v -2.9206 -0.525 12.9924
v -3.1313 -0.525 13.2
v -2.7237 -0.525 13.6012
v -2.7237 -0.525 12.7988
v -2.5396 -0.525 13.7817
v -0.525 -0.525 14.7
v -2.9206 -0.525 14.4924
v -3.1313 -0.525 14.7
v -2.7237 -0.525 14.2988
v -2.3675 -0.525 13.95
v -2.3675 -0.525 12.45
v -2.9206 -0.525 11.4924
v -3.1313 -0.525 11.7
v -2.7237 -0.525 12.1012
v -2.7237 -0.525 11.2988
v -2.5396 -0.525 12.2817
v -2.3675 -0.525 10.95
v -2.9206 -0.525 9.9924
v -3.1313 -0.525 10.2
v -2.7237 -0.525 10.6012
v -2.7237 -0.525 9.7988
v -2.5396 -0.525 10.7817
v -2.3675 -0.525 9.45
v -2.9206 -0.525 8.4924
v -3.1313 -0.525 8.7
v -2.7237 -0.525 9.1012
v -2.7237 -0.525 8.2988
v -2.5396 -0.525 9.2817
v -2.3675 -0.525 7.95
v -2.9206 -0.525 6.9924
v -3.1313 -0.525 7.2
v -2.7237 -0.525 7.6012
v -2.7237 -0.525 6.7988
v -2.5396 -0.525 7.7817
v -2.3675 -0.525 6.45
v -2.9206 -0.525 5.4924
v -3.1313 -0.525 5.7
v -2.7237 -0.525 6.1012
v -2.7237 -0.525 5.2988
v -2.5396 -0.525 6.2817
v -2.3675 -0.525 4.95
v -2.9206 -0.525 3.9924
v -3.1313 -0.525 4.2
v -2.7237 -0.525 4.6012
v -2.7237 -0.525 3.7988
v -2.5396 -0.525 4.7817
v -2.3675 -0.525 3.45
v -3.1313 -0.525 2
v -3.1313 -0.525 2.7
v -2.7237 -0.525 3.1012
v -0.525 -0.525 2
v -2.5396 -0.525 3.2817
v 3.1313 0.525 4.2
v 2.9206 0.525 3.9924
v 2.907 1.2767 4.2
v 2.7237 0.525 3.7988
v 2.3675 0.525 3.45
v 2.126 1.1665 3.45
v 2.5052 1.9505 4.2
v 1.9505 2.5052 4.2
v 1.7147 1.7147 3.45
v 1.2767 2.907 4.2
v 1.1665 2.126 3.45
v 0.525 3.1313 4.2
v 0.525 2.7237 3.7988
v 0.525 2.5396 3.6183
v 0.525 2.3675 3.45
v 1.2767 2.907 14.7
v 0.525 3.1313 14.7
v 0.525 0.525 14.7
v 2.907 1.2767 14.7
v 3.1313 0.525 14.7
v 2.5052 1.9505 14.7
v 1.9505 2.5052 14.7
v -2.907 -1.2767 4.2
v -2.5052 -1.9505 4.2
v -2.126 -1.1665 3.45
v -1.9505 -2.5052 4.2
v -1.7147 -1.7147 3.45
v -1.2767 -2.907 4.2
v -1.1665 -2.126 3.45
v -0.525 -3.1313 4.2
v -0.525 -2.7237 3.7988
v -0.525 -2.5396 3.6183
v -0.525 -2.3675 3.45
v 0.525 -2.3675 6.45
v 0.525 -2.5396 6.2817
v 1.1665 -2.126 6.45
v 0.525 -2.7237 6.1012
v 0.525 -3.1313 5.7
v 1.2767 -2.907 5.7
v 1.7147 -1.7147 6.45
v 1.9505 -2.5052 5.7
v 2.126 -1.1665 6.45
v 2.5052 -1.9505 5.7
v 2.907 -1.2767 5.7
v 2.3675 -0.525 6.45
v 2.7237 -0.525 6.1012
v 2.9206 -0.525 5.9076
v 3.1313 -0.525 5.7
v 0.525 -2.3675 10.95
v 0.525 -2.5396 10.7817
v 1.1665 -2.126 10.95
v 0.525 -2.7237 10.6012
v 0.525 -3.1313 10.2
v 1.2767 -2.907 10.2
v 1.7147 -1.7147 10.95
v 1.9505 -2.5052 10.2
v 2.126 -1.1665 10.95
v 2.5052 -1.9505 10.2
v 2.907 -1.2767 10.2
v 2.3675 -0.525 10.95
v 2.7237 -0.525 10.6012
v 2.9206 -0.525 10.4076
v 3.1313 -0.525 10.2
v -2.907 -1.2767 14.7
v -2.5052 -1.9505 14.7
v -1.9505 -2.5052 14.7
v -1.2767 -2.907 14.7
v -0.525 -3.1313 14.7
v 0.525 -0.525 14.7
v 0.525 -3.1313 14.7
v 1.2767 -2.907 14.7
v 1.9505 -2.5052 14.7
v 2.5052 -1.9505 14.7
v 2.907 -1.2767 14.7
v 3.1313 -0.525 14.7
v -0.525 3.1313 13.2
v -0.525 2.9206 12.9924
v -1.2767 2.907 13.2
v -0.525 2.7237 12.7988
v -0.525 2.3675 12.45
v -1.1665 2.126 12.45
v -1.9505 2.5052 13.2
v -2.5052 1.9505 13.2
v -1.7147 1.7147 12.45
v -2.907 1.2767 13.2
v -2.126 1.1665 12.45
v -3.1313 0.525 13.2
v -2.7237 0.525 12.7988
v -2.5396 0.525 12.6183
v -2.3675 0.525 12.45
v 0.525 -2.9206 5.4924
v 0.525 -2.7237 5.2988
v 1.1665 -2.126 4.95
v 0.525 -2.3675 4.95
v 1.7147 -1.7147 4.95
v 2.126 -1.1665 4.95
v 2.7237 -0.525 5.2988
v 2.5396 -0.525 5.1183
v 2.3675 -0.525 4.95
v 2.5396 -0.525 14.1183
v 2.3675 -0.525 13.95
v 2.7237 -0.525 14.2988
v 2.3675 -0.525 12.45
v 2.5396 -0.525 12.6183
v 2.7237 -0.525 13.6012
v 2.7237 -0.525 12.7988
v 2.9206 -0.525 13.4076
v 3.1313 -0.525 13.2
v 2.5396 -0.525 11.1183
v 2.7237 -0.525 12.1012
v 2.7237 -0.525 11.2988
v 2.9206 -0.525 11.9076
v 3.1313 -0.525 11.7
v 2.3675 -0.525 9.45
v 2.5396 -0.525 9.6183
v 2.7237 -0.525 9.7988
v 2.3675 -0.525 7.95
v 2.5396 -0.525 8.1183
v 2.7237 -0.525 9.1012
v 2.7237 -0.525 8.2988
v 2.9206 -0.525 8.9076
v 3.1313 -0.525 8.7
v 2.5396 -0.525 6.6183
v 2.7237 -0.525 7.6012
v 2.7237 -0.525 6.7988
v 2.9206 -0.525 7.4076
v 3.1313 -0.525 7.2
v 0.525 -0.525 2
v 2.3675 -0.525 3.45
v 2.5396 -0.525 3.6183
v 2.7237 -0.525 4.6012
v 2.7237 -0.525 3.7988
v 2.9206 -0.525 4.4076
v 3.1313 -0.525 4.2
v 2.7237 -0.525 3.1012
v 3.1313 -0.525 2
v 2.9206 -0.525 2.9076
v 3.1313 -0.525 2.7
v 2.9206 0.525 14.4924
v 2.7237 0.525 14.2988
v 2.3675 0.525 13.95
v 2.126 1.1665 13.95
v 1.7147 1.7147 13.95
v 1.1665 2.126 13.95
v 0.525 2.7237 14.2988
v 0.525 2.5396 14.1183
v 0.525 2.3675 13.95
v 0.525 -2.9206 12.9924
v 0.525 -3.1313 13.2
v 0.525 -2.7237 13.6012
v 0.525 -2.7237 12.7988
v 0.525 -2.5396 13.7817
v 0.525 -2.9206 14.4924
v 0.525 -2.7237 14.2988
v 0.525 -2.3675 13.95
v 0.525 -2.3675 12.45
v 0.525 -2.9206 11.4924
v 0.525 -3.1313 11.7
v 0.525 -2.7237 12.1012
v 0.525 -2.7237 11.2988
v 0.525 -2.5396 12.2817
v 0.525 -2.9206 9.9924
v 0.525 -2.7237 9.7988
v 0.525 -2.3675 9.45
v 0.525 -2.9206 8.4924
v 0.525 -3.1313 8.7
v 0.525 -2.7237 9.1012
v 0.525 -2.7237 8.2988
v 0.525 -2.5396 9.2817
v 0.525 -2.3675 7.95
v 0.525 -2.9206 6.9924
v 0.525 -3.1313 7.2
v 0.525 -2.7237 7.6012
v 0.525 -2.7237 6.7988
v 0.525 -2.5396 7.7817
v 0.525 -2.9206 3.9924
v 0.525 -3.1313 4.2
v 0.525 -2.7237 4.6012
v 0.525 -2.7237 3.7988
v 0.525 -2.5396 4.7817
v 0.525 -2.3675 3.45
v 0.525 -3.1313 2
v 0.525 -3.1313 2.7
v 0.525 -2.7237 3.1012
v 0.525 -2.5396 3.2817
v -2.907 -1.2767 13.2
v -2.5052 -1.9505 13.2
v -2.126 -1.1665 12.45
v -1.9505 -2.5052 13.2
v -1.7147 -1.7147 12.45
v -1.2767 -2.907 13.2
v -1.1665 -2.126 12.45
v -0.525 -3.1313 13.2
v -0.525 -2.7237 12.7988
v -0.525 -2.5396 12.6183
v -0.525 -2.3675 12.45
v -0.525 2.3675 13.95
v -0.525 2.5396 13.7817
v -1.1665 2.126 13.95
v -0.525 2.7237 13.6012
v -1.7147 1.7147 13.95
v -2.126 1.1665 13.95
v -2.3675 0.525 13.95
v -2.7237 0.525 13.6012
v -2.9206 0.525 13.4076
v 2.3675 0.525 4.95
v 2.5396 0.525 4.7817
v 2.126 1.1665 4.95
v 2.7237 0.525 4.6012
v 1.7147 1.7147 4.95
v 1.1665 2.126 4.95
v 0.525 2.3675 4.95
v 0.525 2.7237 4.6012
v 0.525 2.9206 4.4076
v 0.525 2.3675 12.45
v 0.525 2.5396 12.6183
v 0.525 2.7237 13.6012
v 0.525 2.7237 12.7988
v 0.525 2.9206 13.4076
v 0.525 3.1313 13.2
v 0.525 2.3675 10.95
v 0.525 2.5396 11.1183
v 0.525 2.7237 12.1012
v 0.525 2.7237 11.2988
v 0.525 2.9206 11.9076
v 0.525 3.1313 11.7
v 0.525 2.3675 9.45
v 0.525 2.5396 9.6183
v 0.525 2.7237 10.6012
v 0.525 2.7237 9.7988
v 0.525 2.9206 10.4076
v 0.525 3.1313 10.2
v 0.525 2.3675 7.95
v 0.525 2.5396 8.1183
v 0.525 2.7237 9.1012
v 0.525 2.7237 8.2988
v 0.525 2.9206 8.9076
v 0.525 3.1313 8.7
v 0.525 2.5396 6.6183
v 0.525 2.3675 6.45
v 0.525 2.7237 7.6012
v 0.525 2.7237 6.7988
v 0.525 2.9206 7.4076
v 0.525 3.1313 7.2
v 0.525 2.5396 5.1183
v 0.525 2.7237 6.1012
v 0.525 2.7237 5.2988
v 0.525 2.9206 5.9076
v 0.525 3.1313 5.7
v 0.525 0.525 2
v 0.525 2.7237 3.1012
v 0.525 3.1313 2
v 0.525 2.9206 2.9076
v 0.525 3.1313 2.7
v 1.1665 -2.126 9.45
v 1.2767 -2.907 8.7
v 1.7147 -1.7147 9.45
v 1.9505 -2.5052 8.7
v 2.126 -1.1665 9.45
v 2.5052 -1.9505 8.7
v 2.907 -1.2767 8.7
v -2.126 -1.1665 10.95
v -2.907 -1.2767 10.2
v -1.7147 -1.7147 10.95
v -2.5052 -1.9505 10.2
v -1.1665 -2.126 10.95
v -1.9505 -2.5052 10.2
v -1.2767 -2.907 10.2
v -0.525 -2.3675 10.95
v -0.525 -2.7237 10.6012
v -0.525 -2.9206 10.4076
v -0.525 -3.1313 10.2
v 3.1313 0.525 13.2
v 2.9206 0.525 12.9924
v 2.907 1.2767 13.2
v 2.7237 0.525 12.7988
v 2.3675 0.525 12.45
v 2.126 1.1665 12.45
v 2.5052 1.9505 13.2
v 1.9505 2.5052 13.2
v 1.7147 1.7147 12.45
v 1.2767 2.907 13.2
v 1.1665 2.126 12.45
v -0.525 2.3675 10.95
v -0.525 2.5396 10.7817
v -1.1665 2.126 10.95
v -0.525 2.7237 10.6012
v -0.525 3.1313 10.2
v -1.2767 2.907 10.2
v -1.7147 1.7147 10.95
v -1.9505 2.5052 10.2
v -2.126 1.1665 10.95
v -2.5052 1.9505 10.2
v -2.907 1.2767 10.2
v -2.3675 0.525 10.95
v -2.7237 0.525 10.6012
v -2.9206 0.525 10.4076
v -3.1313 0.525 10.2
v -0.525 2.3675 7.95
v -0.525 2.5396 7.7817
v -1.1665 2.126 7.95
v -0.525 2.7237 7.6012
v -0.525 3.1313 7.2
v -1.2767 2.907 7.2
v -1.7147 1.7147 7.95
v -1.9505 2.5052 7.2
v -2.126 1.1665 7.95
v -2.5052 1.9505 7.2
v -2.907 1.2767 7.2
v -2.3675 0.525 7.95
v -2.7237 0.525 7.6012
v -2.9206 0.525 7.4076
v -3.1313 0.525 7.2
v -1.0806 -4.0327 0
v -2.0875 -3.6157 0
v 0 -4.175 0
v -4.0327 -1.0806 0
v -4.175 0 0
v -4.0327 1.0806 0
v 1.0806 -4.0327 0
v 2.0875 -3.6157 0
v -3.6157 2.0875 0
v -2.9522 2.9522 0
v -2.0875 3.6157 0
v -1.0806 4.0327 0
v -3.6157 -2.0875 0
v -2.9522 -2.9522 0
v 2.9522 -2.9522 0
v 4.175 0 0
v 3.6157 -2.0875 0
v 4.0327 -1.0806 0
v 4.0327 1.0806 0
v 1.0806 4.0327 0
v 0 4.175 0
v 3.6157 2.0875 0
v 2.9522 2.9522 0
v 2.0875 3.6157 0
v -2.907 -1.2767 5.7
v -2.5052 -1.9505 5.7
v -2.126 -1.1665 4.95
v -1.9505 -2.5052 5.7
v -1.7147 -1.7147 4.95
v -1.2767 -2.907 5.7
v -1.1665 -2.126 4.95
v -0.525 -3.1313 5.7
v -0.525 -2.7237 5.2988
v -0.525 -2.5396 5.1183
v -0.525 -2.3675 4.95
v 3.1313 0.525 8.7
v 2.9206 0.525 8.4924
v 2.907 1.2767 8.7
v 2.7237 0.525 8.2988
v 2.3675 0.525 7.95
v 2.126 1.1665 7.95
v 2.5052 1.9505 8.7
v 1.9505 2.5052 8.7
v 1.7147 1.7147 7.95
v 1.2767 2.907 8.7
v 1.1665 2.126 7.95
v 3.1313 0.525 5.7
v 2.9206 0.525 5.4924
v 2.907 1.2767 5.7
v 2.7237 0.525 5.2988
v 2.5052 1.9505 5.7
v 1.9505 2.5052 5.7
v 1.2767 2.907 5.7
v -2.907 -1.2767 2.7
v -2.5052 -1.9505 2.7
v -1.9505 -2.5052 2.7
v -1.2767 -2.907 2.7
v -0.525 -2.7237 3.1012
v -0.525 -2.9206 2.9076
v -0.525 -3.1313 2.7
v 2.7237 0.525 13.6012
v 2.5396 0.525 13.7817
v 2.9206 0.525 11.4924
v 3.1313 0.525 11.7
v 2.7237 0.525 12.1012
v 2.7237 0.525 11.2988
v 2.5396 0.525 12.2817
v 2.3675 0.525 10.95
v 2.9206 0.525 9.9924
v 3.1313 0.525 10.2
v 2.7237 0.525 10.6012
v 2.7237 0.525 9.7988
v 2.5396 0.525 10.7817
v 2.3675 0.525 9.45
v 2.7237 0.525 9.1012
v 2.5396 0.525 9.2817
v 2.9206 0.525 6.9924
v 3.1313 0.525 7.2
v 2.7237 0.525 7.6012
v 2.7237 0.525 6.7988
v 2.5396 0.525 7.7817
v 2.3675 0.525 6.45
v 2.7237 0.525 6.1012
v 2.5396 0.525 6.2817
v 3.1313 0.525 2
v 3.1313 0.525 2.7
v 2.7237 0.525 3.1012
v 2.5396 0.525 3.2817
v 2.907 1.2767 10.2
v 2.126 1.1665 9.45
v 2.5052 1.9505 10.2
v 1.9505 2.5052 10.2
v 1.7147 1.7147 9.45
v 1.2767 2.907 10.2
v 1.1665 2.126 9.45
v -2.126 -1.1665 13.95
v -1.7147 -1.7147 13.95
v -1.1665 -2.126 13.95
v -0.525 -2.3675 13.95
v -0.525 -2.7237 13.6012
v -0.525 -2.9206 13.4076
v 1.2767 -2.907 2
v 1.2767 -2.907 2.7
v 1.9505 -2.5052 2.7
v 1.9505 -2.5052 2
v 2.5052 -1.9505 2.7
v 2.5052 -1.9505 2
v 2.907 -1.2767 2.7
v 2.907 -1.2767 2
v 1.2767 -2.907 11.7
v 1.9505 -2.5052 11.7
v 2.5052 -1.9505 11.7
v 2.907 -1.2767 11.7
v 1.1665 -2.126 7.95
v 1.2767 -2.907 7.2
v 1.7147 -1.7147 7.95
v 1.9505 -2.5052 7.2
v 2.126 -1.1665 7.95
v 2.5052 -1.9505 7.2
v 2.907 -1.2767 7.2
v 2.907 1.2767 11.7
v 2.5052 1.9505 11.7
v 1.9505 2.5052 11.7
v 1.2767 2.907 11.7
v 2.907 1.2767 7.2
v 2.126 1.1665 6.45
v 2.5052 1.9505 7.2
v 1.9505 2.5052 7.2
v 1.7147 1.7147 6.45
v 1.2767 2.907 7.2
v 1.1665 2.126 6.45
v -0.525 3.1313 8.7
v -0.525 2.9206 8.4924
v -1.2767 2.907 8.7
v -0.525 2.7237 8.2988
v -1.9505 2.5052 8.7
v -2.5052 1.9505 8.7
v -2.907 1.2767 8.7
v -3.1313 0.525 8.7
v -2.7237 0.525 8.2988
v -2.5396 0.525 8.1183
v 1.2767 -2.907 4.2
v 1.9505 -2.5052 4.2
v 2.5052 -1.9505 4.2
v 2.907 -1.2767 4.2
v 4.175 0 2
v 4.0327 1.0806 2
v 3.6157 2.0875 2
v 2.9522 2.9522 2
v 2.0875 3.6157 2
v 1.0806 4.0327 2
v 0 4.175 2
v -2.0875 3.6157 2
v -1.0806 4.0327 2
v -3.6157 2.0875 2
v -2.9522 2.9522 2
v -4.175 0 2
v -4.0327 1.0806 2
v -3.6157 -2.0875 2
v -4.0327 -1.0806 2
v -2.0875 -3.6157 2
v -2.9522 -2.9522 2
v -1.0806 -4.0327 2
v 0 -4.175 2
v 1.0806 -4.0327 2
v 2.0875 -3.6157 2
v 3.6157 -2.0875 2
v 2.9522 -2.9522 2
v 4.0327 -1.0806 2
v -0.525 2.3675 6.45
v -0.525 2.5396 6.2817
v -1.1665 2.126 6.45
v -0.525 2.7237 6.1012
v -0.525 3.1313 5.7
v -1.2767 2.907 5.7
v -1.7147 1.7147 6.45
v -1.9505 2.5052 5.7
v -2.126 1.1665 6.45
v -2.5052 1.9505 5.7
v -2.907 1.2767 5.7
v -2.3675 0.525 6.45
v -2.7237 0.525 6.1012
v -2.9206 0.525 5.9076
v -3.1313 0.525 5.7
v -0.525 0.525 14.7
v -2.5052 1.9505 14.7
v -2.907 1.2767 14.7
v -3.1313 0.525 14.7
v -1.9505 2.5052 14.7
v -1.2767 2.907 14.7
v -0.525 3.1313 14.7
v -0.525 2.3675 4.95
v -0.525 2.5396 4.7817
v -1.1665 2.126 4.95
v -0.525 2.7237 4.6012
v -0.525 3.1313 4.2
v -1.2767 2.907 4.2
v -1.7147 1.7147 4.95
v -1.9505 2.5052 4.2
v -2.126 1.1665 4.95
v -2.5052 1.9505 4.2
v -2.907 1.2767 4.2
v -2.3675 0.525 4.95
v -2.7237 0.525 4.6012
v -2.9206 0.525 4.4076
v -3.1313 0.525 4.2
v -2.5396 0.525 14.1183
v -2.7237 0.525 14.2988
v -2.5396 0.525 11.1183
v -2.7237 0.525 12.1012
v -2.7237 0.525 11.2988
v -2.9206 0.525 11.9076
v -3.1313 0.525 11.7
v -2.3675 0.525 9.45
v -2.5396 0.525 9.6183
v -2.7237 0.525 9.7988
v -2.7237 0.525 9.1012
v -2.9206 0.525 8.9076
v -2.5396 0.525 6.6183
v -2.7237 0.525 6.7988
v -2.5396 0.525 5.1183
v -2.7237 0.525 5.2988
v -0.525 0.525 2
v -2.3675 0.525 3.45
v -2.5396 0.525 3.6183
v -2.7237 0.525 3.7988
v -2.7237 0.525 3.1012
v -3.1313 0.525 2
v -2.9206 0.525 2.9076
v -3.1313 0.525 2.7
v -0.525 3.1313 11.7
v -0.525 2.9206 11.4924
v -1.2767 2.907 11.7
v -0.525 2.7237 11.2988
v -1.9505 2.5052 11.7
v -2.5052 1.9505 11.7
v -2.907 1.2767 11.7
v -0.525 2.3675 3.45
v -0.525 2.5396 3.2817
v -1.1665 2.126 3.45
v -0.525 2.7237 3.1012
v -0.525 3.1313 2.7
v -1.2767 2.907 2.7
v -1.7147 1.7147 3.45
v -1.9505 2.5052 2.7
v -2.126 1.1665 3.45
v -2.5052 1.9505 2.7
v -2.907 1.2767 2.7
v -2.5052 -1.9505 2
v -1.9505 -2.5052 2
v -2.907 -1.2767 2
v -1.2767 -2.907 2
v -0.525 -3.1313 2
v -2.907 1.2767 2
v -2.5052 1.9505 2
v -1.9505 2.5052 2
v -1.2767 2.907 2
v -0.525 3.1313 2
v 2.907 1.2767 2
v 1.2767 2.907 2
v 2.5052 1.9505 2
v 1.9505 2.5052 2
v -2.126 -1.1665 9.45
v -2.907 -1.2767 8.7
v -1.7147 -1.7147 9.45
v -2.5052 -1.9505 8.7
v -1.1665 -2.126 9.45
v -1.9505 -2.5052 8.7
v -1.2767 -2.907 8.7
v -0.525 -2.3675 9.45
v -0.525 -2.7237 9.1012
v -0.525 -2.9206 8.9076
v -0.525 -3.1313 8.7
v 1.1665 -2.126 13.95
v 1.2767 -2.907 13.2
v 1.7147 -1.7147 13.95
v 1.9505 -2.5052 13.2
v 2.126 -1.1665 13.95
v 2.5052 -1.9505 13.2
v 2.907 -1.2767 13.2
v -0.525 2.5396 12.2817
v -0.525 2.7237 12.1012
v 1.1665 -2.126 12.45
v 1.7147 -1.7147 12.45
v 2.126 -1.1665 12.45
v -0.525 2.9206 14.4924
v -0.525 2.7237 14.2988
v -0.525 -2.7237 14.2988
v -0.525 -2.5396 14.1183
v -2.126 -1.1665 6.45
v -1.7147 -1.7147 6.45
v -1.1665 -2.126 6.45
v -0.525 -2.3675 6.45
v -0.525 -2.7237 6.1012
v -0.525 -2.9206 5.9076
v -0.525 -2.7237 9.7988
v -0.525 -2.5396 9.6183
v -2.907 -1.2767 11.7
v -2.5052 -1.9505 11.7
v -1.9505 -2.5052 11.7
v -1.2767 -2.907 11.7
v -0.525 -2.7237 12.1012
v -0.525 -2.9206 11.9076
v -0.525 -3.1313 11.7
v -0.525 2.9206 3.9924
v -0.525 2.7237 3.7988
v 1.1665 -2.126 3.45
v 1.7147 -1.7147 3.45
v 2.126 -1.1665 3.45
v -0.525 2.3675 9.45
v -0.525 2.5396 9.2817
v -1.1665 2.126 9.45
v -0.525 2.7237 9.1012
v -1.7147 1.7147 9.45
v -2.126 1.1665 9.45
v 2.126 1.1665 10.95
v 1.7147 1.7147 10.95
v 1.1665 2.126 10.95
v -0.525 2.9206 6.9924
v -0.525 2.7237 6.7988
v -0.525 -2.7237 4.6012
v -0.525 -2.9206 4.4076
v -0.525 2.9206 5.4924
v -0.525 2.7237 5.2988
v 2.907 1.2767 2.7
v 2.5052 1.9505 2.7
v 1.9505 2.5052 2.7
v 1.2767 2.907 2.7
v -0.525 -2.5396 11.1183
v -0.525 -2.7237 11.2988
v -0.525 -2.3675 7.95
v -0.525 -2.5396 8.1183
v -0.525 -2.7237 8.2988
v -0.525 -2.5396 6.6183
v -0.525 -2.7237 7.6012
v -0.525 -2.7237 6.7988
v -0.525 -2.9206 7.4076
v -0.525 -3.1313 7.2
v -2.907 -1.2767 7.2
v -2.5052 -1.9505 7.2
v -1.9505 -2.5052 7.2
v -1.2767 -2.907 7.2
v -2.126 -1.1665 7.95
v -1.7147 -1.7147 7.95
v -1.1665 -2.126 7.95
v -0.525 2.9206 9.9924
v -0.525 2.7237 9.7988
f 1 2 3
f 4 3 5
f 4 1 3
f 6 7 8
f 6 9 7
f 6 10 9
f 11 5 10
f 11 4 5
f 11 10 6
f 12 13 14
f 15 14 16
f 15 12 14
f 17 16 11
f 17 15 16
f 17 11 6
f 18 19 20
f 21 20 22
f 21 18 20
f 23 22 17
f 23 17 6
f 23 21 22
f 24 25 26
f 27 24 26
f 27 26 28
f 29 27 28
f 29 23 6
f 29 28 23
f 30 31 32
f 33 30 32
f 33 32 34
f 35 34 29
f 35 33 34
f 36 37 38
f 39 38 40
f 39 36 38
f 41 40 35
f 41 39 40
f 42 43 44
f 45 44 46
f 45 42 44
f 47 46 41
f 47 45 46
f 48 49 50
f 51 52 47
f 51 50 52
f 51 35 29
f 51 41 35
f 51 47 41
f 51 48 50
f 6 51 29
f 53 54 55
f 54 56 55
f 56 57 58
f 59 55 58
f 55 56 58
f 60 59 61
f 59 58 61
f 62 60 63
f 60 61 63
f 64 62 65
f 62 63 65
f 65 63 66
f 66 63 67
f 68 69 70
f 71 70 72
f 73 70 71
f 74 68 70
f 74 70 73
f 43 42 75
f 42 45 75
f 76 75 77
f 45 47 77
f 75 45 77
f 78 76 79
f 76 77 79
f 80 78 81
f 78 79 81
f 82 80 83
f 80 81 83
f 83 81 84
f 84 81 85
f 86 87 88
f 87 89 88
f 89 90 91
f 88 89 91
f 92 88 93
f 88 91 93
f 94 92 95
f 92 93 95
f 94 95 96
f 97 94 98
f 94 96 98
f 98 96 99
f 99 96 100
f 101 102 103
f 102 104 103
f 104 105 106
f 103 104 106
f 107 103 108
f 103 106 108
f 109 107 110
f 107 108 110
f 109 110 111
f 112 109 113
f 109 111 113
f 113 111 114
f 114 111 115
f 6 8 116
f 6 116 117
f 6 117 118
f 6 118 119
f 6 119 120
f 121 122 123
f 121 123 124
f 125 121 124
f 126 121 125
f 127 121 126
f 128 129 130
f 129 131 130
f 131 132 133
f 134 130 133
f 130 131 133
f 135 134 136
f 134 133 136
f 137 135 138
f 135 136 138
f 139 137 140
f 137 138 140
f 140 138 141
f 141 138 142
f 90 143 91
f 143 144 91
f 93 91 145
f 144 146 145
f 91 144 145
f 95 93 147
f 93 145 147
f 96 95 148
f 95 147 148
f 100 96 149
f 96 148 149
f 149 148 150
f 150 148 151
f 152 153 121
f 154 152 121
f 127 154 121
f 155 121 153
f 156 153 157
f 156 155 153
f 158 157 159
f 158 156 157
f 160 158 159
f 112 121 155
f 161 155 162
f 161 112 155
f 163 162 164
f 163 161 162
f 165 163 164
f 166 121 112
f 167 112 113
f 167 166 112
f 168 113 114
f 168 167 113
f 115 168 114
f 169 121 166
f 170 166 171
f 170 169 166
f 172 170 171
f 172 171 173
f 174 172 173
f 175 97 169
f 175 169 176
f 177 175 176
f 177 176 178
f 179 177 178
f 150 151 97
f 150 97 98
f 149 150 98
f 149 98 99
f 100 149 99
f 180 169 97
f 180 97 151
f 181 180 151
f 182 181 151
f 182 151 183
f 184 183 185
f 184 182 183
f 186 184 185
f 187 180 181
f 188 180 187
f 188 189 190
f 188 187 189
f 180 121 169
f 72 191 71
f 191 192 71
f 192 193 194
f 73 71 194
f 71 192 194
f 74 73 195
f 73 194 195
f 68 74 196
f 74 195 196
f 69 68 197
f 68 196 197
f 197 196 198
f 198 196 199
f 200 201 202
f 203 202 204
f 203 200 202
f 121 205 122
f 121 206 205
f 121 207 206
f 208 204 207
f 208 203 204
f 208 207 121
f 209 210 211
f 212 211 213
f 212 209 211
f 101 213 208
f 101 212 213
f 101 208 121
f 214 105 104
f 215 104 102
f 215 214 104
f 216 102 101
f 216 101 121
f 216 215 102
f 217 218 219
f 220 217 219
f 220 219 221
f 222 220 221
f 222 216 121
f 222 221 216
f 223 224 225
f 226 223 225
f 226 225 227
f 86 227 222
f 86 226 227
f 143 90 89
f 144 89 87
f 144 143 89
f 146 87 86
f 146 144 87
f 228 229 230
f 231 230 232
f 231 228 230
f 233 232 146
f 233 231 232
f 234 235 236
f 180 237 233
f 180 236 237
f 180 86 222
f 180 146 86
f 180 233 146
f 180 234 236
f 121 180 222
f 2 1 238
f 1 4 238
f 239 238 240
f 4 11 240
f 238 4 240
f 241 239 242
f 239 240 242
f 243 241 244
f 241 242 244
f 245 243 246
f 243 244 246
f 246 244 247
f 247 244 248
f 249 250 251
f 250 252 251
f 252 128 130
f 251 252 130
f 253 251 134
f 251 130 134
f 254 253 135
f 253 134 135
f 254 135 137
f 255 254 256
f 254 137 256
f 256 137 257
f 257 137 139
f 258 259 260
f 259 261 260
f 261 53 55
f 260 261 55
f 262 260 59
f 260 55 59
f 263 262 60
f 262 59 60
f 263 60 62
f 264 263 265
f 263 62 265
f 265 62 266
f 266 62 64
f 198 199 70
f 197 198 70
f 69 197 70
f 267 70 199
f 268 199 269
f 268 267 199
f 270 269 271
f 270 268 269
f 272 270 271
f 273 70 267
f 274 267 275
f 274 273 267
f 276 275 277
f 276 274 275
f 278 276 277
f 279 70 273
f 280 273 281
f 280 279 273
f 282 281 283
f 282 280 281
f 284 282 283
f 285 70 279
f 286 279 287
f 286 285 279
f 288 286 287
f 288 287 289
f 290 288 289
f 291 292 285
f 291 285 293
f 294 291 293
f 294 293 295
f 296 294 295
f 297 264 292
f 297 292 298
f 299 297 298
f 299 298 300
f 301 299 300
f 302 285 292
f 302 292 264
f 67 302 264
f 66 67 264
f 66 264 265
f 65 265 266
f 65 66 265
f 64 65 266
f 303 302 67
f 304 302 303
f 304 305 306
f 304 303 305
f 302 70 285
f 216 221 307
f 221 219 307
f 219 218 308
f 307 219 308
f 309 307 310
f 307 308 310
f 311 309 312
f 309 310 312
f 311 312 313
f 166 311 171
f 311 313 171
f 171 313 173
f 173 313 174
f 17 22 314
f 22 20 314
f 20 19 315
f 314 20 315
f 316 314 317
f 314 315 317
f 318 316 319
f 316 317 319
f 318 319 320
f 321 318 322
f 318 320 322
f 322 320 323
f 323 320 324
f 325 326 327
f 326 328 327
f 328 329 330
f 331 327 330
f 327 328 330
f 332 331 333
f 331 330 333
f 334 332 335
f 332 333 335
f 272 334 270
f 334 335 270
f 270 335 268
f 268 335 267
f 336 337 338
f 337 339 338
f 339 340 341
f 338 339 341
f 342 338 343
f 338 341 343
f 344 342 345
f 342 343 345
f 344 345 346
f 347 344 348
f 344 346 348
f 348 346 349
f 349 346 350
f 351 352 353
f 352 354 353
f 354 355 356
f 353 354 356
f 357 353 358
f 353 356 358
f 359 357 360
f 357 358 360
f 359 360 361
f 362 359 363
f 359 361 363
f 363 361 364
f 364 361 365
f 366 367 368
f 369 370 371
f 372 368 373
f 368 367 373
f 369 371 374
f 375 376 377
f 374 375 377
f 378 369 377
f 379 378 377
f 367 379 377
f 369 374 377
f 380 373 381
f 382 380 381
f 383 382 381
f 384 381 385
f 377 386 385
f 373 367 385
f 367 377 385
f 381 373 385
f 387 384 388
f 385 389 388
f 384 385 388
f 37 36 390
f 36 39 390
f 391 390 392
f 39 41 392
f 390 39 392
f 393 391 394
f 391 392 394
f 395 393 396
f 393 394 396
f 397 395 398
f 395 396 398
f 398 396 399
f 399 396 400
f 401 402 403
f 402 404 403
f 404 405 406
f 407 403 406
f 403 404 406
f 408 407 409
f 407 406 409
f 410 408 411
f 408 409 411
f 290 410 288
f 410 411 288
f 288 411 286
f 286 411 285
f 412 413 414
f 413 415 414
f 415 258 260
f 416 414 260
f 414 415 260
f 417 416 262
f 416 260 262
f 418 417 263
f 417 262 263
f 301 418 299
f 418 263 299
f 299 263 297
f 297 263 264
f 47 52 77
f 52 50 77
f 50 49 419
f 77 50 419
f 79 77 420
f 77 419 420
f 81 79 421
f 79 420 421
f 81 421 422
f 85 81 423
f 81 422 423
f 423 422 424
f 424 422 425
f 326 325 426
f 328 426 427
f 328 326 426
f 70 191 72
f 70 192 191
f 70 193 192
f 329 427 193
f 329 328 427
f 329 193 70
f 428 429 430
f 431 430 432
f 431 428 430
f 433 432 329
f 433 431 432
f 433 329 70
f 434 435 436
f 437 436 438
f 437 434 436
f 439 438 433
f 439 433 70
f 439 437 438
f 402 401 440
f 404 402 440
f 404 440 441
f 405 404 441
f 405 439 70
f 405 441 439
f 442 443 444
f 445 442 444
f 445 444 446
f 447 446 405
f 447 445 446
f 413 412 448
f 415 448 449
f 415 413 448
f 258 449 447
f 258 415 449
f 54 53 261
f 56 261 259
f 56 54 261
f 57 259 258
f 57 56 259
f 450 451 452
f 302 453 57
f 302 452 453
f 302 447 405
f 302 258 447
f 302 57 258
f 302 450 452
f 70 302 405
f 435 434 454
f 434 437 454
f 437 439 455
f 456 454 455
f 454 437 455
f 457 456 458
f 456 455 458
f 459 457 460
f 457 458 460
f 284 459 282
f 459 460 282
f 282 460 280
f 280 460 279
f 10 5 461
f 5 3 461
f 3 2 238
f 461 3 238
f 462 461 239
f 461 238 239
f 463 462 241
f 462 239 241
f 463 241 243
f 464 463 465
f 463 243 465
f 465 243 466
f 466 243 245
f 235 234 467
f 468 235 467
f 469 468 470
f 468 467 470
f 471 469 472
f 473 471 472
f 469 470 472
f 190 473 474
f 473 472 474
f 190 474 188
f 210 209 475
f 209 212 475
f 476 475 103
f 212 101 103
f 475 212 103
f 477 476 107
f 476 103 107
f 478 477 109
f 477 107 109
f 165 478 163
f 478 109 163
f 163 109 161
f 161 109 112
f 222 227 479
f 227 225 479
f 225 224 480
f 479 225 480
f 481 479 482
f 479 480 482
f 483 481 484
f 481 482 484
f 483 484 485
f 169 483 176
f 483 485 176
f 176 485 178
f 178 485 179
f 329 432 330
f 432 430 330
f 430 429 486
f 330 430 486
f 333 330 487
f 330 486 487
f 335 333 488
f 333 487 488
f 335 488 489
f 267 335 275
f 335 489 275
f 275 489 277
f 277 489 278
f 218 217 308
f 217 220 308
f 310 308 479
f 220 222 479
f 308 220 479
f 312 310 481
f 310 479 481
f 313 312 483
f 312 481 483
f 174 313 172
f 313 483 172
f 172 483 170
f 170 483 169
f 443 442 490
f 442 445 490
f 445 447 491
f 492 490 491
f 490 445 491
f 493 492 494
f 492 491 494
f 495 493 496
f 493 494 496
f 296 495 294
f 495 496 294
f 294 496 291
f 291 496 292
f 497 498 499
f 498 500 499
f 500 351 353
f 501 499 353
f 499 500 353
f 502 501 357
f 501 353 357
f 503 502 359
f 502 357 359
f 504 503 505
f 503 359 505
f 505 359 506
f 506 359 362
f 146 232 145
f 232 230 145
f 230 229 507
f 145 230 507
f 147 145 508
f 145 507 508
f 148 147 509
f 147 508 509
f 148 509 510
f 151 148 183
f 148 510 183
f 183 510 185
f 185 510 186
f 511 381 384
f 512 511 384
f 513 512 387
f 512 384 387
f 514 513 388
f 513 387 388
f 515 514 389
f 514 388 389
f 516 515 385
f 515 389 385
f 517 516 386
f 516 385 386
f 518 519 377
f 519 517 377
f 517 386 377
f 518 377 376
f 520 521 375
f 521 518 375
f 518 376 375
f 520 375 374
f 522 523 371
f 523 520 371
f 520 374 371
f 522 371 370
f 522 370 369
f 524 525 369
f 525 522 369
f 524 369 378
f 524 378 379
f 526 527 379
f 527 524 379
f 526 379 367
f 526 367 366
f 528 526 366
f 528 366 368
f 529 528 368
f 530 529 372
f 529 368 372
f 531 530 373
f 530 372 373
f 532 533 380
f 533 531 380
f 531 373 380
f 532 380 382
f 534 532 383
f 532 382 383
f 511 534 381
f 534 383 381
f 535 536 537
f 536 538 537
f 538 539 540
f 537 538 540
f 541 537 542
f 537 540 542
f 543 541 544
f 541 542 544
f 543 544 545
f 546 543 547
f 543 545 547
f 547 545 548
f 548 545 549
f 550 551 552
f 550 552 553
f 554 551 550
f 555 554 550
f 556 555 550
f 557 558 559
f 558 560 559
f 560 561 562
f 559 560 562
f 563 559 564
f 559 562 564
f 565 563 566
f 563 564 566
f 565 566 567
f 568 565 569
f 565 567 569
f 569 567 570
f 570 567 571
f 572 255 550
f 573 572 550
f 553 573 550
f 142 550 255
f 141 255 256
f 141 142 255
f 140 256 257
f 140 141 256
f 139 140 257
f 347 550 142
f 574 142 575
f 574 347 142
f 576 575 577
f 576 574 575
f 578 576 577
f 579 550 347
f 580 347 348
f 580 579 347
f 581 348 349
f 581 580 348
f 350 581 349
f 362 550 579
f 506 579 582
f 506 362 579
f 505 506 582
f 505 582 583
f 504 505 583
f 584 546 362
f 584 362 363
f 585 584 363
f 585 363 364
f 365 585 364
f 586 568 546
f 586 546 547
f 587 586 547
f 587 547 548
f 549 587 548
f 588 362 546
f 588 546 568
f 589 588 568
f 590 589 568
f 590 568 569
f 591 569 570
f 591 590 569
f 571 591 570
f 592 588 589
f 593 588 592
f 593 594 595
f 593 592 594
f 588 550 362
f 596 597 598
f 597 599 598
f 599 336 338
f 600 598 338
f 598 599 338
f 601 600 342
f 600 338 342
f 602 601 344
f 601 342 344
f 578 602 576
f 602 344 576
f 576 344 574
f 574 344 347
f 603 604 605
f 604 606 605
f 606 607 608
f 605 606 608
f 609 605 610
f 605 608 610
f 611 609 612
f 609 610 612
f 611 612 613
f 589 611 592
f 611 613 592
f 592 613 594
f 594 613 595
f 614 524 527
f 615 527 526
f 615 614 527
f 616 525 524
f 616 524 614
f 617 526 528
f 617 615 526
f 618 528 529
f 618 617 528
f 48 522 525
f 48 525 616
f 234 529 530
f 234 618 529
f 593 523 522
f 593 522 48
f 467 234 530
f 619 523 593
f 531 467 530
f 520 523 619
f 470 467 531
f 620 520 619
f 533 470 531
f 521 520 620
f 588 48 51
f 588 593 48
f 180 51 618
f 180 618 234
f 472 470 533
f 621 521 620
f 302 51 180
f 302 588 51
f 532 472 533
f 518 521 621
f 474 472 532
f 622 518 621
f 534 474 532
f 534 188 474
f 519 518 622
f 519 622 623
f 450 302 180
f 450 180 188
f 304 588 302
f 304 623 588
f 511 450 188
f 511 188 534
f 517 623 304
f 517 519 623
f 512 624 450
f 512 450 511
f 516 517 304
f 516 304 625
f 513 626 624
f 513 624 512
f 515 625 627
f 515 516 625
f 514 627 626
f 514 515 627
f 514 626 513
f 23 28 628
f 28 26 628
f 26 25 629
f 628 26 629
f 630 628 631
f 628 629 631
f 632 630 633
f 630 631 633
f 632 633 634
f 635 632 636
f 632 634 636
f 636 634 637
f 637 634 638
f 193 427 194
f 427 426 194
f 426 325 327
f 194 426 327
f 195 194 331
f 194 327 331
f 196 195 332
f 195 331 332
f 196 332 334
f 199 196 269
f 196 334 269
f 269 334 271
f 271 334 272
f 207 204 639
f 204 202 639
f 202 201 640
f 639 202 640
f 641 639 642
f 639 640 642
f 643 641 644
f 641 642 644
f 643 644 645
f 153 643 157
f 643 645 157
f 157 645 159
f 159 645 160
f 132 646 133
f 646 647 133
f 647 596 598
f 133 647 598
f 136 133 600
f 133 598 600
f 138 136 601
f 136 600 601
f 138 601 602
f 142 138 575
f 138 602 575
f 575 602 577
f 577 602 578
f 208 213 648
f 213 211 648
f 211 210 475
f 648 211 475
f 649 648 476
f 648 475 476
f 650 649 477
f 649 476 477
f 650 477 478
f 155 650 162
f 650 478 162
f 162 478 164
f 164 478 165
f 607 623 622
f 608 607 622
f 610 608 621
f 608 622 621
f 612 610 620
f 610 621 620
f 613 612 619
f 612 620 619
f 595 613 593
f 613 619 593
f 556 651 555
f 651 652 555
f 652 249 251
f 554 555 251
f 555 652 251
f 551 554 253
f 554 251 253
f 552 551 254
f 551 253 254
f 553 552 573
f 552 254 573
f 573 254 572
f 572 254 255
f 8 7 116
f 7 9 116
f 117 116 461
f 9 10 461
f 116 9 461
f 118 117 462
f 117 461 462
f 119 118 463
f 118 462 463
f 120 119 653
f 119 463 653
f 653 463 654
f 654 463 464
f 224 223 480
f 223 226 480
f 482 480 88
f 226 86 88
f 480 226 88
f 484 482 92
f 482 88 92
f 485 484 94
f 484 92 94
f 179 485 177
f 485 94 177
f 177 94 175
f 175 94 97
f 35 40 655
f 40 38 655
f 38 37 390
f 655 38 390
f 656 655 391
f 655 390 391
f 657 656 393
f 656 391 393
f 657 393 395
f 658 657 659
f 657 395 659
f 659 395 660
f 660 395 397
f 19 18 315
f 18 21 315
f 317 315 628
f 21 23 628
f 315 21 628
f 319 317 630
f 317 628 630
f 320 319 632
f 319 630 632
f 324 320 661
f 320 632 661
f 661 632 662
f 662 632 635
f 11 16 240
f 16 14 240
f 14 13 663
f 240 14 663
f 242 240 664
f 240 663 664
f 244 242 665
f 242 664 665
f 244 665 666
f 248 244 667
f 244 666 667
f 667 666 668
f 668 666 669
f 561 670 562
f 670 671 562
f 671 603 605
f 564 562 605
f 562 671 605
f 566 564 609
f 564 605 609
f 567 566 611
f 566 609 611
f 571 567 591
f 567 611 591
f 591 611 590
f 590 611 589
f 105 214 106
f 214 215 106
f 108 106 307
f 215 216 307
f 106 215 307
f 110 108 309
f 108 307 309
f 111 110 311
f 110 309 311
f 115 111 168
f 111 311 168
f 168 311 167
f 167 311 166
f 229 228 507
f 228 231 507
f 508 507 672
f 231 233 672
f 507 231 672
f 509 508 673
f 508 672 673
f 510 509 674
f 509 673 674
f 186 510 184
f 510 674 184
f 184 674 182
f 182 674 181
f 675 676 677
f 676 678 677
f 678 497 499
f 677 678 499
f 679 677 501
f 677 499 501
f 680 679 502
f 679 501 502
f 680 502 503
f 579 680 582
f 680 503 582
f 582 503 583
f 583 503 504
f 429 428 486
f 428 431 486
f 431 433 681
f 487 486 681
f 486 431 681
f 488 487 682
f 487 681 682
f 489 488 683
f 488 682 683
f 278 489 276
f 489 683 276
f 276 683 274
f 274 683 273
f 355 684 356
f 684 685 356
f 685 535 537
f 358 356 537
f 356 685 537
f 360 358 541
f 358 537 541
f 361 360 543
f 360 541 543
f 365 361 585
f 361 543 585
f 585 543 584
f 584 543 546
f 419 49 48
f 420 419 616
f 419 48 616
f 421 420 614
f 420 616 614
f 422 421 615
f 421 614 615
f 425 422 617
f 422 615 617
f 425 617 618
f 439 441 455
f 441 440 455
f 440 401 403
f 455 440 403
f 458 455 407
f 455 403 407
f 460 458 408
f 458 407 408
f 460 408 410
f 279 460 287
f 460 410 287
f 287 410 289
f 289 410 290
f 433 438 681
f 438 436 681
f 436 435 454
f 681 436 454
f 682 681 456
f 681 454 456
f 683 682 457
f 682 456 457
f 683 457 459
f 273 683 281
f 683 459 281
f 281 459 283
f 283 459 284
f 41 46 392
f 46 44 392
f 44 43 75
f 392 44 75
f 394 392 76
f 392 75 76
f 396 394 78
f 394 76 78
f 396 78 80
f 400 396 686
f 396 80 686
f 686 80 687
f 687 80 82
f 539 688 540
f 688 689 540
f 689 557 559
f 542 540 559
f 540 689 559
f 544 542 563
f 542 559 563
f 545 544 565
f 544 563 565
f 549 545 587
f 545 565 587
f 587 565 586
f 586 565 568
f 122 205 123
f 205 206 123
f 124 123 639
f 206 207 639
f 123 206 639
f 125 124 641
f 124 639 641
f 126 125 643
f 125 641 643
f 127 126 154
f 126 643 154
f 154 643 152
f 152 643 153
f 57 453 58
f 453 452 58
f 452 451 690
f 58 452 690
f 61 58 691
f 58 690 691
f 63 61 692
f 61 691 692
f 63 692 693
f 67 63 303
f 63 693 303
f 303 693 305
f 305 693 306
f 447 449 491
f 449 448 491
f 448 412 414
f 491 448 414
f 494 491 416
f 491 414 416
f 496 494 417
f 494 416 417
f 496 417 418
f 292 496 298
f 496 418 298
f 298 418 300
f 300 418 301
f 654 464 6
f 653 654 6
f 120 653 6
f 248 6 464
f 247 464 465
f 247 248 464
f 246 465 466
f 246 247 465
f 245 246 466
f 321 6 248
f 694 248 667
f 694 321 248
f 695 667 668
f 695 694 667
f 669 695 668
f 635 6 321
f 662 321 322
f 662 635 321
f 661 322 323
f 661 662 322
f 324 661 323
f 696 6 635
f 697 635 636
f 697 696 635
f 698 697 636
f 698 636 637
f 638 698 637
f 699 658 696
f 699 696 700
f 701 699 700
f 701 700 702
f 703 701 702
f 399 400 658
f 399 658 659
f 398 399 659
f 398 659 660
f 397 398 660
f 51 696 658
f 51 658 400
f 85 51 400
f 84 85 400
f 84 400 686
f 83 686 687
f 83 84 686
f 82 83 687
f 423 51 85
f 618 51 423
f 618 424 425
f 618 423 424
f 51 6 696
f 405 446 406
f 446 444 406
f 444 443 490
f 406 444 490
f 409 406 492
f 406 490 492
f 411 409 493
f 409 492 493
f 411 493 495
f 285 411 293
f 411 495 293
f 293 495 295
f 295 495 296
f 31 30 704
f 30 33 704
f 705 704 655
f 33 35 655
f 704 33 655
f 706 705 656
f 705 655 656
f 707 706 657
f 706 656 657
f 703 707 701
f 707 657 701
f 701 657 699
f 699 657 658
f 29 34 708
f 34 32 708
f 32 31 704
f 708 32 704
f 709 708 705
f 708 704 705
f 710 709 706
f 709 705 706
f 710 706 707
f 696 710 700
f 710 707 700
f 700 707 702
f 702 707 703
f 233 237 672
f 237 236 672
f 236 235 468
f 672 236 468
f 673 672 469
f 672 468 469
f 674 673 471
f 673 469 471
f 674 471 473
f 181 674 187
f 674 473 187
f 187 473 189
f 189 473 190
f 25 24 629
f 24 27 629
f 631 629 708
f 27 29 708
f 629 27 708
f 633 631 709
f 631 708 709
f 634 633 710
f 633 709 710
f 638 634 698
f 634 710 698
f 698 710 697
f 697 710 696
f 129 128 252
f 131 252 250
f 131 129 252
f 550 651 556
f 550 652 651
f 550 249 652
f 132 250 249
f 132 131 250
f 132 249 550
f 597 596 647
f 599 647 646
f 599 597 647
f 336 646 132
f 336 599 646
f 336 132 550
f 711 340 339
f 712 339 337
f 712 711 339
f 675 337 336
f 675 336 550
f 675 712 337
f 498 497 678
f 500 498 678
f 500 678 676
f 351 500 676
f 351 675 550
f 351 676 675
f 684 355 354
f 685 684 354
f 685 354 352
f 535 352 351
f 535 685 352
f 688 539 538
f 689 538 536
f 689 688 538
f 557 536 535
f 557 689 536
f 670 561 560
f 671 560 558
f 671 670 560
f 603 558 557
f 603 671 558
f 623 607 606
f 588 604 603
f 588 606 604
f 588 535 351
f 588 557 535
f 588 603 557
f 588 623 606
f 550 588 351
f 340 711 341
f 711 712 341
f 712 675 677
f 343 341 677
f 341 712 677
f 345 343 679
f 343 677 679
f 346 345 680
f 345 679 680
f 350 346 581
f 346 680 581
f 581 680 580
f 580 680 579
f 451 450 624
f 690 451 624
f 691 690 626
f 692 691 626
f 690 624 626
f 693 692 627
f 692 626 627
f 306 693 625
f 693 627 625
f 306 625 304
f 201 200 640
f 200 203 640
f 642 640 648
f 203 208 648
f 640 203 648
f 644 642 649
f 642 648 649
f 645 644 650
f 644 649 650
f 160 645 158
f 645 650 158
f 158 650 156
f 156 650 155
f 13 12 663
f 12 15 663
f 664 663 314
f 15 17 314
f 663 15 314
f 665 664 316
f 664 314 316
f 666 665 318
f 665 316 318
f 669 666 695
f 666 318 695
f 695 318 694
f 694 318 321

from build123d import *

# Parameters (mm, degrees)
SKETCH004_R         = 4.175
PAD003_DEPTH        = 2
SKETCH005_R         = 3.175
PAD004_DEPTH        = 12.7
POCKET001_DEPTH     = 12.701
LINEARPATTERN_COUNT = 8
LINEARPATTERN_PITCH = 1.5


with BuildPart() as part:
    # Sketch004 → Pad003 (new body)
    with BuildSketch(Plane.XY):
        Circle(SKETCH004_R)
    extrude(amount=PAD003_DEPTH)

    # Sketch005 (on DatumPlane) → Pad004 (join)
    with BuildSketch(Plane.XY.offset(2)):
        Circle(SKETCH005_R)
    extrude(amount=PAD004_DEPTH)

    # Sketch006 (on DatumPlane) → Pocket001 (cut, through all)
    with BuildSketch(Plane.XY.offset(2)):
        Polygon((13.225, 0.525), (0.525, 0.525), (0.525, 13.225), (-0.525, 13.225), (-0.525, 0.525), (-13.225, 0.525), (-13.225, -0.525), (-0.525, -0.525), (-0.525, -13.225), (0.525, -13.225), (0.525, -0.525), (13.225, -0.525), align=None)
    extrude(amount=POCKET001_DEPTH, mode=Mode.SUBTRACT)

    # Sketch007 (on DatumPlane) → Groove (revolve, cut)
    with BuildSketch(Plane.XZ):
        Polygon((3.175, 14.7), (2.425, 13.95), (3.175, 13.2), align=None)
    groove = revolve(axis=Axis((0, 0, 0), (0, 0, 1)), mode=Mode.SUBTRACT)

    # LinearPattern: Groove ×8
    with Locations(*[(0, 0, -i * LINEARPATTERN_PITCH) for i in range(1, LINEARPATTERN_COUNT)]):
        add(groove, mode=Mode.SUBTRACT)


solid = part.part
